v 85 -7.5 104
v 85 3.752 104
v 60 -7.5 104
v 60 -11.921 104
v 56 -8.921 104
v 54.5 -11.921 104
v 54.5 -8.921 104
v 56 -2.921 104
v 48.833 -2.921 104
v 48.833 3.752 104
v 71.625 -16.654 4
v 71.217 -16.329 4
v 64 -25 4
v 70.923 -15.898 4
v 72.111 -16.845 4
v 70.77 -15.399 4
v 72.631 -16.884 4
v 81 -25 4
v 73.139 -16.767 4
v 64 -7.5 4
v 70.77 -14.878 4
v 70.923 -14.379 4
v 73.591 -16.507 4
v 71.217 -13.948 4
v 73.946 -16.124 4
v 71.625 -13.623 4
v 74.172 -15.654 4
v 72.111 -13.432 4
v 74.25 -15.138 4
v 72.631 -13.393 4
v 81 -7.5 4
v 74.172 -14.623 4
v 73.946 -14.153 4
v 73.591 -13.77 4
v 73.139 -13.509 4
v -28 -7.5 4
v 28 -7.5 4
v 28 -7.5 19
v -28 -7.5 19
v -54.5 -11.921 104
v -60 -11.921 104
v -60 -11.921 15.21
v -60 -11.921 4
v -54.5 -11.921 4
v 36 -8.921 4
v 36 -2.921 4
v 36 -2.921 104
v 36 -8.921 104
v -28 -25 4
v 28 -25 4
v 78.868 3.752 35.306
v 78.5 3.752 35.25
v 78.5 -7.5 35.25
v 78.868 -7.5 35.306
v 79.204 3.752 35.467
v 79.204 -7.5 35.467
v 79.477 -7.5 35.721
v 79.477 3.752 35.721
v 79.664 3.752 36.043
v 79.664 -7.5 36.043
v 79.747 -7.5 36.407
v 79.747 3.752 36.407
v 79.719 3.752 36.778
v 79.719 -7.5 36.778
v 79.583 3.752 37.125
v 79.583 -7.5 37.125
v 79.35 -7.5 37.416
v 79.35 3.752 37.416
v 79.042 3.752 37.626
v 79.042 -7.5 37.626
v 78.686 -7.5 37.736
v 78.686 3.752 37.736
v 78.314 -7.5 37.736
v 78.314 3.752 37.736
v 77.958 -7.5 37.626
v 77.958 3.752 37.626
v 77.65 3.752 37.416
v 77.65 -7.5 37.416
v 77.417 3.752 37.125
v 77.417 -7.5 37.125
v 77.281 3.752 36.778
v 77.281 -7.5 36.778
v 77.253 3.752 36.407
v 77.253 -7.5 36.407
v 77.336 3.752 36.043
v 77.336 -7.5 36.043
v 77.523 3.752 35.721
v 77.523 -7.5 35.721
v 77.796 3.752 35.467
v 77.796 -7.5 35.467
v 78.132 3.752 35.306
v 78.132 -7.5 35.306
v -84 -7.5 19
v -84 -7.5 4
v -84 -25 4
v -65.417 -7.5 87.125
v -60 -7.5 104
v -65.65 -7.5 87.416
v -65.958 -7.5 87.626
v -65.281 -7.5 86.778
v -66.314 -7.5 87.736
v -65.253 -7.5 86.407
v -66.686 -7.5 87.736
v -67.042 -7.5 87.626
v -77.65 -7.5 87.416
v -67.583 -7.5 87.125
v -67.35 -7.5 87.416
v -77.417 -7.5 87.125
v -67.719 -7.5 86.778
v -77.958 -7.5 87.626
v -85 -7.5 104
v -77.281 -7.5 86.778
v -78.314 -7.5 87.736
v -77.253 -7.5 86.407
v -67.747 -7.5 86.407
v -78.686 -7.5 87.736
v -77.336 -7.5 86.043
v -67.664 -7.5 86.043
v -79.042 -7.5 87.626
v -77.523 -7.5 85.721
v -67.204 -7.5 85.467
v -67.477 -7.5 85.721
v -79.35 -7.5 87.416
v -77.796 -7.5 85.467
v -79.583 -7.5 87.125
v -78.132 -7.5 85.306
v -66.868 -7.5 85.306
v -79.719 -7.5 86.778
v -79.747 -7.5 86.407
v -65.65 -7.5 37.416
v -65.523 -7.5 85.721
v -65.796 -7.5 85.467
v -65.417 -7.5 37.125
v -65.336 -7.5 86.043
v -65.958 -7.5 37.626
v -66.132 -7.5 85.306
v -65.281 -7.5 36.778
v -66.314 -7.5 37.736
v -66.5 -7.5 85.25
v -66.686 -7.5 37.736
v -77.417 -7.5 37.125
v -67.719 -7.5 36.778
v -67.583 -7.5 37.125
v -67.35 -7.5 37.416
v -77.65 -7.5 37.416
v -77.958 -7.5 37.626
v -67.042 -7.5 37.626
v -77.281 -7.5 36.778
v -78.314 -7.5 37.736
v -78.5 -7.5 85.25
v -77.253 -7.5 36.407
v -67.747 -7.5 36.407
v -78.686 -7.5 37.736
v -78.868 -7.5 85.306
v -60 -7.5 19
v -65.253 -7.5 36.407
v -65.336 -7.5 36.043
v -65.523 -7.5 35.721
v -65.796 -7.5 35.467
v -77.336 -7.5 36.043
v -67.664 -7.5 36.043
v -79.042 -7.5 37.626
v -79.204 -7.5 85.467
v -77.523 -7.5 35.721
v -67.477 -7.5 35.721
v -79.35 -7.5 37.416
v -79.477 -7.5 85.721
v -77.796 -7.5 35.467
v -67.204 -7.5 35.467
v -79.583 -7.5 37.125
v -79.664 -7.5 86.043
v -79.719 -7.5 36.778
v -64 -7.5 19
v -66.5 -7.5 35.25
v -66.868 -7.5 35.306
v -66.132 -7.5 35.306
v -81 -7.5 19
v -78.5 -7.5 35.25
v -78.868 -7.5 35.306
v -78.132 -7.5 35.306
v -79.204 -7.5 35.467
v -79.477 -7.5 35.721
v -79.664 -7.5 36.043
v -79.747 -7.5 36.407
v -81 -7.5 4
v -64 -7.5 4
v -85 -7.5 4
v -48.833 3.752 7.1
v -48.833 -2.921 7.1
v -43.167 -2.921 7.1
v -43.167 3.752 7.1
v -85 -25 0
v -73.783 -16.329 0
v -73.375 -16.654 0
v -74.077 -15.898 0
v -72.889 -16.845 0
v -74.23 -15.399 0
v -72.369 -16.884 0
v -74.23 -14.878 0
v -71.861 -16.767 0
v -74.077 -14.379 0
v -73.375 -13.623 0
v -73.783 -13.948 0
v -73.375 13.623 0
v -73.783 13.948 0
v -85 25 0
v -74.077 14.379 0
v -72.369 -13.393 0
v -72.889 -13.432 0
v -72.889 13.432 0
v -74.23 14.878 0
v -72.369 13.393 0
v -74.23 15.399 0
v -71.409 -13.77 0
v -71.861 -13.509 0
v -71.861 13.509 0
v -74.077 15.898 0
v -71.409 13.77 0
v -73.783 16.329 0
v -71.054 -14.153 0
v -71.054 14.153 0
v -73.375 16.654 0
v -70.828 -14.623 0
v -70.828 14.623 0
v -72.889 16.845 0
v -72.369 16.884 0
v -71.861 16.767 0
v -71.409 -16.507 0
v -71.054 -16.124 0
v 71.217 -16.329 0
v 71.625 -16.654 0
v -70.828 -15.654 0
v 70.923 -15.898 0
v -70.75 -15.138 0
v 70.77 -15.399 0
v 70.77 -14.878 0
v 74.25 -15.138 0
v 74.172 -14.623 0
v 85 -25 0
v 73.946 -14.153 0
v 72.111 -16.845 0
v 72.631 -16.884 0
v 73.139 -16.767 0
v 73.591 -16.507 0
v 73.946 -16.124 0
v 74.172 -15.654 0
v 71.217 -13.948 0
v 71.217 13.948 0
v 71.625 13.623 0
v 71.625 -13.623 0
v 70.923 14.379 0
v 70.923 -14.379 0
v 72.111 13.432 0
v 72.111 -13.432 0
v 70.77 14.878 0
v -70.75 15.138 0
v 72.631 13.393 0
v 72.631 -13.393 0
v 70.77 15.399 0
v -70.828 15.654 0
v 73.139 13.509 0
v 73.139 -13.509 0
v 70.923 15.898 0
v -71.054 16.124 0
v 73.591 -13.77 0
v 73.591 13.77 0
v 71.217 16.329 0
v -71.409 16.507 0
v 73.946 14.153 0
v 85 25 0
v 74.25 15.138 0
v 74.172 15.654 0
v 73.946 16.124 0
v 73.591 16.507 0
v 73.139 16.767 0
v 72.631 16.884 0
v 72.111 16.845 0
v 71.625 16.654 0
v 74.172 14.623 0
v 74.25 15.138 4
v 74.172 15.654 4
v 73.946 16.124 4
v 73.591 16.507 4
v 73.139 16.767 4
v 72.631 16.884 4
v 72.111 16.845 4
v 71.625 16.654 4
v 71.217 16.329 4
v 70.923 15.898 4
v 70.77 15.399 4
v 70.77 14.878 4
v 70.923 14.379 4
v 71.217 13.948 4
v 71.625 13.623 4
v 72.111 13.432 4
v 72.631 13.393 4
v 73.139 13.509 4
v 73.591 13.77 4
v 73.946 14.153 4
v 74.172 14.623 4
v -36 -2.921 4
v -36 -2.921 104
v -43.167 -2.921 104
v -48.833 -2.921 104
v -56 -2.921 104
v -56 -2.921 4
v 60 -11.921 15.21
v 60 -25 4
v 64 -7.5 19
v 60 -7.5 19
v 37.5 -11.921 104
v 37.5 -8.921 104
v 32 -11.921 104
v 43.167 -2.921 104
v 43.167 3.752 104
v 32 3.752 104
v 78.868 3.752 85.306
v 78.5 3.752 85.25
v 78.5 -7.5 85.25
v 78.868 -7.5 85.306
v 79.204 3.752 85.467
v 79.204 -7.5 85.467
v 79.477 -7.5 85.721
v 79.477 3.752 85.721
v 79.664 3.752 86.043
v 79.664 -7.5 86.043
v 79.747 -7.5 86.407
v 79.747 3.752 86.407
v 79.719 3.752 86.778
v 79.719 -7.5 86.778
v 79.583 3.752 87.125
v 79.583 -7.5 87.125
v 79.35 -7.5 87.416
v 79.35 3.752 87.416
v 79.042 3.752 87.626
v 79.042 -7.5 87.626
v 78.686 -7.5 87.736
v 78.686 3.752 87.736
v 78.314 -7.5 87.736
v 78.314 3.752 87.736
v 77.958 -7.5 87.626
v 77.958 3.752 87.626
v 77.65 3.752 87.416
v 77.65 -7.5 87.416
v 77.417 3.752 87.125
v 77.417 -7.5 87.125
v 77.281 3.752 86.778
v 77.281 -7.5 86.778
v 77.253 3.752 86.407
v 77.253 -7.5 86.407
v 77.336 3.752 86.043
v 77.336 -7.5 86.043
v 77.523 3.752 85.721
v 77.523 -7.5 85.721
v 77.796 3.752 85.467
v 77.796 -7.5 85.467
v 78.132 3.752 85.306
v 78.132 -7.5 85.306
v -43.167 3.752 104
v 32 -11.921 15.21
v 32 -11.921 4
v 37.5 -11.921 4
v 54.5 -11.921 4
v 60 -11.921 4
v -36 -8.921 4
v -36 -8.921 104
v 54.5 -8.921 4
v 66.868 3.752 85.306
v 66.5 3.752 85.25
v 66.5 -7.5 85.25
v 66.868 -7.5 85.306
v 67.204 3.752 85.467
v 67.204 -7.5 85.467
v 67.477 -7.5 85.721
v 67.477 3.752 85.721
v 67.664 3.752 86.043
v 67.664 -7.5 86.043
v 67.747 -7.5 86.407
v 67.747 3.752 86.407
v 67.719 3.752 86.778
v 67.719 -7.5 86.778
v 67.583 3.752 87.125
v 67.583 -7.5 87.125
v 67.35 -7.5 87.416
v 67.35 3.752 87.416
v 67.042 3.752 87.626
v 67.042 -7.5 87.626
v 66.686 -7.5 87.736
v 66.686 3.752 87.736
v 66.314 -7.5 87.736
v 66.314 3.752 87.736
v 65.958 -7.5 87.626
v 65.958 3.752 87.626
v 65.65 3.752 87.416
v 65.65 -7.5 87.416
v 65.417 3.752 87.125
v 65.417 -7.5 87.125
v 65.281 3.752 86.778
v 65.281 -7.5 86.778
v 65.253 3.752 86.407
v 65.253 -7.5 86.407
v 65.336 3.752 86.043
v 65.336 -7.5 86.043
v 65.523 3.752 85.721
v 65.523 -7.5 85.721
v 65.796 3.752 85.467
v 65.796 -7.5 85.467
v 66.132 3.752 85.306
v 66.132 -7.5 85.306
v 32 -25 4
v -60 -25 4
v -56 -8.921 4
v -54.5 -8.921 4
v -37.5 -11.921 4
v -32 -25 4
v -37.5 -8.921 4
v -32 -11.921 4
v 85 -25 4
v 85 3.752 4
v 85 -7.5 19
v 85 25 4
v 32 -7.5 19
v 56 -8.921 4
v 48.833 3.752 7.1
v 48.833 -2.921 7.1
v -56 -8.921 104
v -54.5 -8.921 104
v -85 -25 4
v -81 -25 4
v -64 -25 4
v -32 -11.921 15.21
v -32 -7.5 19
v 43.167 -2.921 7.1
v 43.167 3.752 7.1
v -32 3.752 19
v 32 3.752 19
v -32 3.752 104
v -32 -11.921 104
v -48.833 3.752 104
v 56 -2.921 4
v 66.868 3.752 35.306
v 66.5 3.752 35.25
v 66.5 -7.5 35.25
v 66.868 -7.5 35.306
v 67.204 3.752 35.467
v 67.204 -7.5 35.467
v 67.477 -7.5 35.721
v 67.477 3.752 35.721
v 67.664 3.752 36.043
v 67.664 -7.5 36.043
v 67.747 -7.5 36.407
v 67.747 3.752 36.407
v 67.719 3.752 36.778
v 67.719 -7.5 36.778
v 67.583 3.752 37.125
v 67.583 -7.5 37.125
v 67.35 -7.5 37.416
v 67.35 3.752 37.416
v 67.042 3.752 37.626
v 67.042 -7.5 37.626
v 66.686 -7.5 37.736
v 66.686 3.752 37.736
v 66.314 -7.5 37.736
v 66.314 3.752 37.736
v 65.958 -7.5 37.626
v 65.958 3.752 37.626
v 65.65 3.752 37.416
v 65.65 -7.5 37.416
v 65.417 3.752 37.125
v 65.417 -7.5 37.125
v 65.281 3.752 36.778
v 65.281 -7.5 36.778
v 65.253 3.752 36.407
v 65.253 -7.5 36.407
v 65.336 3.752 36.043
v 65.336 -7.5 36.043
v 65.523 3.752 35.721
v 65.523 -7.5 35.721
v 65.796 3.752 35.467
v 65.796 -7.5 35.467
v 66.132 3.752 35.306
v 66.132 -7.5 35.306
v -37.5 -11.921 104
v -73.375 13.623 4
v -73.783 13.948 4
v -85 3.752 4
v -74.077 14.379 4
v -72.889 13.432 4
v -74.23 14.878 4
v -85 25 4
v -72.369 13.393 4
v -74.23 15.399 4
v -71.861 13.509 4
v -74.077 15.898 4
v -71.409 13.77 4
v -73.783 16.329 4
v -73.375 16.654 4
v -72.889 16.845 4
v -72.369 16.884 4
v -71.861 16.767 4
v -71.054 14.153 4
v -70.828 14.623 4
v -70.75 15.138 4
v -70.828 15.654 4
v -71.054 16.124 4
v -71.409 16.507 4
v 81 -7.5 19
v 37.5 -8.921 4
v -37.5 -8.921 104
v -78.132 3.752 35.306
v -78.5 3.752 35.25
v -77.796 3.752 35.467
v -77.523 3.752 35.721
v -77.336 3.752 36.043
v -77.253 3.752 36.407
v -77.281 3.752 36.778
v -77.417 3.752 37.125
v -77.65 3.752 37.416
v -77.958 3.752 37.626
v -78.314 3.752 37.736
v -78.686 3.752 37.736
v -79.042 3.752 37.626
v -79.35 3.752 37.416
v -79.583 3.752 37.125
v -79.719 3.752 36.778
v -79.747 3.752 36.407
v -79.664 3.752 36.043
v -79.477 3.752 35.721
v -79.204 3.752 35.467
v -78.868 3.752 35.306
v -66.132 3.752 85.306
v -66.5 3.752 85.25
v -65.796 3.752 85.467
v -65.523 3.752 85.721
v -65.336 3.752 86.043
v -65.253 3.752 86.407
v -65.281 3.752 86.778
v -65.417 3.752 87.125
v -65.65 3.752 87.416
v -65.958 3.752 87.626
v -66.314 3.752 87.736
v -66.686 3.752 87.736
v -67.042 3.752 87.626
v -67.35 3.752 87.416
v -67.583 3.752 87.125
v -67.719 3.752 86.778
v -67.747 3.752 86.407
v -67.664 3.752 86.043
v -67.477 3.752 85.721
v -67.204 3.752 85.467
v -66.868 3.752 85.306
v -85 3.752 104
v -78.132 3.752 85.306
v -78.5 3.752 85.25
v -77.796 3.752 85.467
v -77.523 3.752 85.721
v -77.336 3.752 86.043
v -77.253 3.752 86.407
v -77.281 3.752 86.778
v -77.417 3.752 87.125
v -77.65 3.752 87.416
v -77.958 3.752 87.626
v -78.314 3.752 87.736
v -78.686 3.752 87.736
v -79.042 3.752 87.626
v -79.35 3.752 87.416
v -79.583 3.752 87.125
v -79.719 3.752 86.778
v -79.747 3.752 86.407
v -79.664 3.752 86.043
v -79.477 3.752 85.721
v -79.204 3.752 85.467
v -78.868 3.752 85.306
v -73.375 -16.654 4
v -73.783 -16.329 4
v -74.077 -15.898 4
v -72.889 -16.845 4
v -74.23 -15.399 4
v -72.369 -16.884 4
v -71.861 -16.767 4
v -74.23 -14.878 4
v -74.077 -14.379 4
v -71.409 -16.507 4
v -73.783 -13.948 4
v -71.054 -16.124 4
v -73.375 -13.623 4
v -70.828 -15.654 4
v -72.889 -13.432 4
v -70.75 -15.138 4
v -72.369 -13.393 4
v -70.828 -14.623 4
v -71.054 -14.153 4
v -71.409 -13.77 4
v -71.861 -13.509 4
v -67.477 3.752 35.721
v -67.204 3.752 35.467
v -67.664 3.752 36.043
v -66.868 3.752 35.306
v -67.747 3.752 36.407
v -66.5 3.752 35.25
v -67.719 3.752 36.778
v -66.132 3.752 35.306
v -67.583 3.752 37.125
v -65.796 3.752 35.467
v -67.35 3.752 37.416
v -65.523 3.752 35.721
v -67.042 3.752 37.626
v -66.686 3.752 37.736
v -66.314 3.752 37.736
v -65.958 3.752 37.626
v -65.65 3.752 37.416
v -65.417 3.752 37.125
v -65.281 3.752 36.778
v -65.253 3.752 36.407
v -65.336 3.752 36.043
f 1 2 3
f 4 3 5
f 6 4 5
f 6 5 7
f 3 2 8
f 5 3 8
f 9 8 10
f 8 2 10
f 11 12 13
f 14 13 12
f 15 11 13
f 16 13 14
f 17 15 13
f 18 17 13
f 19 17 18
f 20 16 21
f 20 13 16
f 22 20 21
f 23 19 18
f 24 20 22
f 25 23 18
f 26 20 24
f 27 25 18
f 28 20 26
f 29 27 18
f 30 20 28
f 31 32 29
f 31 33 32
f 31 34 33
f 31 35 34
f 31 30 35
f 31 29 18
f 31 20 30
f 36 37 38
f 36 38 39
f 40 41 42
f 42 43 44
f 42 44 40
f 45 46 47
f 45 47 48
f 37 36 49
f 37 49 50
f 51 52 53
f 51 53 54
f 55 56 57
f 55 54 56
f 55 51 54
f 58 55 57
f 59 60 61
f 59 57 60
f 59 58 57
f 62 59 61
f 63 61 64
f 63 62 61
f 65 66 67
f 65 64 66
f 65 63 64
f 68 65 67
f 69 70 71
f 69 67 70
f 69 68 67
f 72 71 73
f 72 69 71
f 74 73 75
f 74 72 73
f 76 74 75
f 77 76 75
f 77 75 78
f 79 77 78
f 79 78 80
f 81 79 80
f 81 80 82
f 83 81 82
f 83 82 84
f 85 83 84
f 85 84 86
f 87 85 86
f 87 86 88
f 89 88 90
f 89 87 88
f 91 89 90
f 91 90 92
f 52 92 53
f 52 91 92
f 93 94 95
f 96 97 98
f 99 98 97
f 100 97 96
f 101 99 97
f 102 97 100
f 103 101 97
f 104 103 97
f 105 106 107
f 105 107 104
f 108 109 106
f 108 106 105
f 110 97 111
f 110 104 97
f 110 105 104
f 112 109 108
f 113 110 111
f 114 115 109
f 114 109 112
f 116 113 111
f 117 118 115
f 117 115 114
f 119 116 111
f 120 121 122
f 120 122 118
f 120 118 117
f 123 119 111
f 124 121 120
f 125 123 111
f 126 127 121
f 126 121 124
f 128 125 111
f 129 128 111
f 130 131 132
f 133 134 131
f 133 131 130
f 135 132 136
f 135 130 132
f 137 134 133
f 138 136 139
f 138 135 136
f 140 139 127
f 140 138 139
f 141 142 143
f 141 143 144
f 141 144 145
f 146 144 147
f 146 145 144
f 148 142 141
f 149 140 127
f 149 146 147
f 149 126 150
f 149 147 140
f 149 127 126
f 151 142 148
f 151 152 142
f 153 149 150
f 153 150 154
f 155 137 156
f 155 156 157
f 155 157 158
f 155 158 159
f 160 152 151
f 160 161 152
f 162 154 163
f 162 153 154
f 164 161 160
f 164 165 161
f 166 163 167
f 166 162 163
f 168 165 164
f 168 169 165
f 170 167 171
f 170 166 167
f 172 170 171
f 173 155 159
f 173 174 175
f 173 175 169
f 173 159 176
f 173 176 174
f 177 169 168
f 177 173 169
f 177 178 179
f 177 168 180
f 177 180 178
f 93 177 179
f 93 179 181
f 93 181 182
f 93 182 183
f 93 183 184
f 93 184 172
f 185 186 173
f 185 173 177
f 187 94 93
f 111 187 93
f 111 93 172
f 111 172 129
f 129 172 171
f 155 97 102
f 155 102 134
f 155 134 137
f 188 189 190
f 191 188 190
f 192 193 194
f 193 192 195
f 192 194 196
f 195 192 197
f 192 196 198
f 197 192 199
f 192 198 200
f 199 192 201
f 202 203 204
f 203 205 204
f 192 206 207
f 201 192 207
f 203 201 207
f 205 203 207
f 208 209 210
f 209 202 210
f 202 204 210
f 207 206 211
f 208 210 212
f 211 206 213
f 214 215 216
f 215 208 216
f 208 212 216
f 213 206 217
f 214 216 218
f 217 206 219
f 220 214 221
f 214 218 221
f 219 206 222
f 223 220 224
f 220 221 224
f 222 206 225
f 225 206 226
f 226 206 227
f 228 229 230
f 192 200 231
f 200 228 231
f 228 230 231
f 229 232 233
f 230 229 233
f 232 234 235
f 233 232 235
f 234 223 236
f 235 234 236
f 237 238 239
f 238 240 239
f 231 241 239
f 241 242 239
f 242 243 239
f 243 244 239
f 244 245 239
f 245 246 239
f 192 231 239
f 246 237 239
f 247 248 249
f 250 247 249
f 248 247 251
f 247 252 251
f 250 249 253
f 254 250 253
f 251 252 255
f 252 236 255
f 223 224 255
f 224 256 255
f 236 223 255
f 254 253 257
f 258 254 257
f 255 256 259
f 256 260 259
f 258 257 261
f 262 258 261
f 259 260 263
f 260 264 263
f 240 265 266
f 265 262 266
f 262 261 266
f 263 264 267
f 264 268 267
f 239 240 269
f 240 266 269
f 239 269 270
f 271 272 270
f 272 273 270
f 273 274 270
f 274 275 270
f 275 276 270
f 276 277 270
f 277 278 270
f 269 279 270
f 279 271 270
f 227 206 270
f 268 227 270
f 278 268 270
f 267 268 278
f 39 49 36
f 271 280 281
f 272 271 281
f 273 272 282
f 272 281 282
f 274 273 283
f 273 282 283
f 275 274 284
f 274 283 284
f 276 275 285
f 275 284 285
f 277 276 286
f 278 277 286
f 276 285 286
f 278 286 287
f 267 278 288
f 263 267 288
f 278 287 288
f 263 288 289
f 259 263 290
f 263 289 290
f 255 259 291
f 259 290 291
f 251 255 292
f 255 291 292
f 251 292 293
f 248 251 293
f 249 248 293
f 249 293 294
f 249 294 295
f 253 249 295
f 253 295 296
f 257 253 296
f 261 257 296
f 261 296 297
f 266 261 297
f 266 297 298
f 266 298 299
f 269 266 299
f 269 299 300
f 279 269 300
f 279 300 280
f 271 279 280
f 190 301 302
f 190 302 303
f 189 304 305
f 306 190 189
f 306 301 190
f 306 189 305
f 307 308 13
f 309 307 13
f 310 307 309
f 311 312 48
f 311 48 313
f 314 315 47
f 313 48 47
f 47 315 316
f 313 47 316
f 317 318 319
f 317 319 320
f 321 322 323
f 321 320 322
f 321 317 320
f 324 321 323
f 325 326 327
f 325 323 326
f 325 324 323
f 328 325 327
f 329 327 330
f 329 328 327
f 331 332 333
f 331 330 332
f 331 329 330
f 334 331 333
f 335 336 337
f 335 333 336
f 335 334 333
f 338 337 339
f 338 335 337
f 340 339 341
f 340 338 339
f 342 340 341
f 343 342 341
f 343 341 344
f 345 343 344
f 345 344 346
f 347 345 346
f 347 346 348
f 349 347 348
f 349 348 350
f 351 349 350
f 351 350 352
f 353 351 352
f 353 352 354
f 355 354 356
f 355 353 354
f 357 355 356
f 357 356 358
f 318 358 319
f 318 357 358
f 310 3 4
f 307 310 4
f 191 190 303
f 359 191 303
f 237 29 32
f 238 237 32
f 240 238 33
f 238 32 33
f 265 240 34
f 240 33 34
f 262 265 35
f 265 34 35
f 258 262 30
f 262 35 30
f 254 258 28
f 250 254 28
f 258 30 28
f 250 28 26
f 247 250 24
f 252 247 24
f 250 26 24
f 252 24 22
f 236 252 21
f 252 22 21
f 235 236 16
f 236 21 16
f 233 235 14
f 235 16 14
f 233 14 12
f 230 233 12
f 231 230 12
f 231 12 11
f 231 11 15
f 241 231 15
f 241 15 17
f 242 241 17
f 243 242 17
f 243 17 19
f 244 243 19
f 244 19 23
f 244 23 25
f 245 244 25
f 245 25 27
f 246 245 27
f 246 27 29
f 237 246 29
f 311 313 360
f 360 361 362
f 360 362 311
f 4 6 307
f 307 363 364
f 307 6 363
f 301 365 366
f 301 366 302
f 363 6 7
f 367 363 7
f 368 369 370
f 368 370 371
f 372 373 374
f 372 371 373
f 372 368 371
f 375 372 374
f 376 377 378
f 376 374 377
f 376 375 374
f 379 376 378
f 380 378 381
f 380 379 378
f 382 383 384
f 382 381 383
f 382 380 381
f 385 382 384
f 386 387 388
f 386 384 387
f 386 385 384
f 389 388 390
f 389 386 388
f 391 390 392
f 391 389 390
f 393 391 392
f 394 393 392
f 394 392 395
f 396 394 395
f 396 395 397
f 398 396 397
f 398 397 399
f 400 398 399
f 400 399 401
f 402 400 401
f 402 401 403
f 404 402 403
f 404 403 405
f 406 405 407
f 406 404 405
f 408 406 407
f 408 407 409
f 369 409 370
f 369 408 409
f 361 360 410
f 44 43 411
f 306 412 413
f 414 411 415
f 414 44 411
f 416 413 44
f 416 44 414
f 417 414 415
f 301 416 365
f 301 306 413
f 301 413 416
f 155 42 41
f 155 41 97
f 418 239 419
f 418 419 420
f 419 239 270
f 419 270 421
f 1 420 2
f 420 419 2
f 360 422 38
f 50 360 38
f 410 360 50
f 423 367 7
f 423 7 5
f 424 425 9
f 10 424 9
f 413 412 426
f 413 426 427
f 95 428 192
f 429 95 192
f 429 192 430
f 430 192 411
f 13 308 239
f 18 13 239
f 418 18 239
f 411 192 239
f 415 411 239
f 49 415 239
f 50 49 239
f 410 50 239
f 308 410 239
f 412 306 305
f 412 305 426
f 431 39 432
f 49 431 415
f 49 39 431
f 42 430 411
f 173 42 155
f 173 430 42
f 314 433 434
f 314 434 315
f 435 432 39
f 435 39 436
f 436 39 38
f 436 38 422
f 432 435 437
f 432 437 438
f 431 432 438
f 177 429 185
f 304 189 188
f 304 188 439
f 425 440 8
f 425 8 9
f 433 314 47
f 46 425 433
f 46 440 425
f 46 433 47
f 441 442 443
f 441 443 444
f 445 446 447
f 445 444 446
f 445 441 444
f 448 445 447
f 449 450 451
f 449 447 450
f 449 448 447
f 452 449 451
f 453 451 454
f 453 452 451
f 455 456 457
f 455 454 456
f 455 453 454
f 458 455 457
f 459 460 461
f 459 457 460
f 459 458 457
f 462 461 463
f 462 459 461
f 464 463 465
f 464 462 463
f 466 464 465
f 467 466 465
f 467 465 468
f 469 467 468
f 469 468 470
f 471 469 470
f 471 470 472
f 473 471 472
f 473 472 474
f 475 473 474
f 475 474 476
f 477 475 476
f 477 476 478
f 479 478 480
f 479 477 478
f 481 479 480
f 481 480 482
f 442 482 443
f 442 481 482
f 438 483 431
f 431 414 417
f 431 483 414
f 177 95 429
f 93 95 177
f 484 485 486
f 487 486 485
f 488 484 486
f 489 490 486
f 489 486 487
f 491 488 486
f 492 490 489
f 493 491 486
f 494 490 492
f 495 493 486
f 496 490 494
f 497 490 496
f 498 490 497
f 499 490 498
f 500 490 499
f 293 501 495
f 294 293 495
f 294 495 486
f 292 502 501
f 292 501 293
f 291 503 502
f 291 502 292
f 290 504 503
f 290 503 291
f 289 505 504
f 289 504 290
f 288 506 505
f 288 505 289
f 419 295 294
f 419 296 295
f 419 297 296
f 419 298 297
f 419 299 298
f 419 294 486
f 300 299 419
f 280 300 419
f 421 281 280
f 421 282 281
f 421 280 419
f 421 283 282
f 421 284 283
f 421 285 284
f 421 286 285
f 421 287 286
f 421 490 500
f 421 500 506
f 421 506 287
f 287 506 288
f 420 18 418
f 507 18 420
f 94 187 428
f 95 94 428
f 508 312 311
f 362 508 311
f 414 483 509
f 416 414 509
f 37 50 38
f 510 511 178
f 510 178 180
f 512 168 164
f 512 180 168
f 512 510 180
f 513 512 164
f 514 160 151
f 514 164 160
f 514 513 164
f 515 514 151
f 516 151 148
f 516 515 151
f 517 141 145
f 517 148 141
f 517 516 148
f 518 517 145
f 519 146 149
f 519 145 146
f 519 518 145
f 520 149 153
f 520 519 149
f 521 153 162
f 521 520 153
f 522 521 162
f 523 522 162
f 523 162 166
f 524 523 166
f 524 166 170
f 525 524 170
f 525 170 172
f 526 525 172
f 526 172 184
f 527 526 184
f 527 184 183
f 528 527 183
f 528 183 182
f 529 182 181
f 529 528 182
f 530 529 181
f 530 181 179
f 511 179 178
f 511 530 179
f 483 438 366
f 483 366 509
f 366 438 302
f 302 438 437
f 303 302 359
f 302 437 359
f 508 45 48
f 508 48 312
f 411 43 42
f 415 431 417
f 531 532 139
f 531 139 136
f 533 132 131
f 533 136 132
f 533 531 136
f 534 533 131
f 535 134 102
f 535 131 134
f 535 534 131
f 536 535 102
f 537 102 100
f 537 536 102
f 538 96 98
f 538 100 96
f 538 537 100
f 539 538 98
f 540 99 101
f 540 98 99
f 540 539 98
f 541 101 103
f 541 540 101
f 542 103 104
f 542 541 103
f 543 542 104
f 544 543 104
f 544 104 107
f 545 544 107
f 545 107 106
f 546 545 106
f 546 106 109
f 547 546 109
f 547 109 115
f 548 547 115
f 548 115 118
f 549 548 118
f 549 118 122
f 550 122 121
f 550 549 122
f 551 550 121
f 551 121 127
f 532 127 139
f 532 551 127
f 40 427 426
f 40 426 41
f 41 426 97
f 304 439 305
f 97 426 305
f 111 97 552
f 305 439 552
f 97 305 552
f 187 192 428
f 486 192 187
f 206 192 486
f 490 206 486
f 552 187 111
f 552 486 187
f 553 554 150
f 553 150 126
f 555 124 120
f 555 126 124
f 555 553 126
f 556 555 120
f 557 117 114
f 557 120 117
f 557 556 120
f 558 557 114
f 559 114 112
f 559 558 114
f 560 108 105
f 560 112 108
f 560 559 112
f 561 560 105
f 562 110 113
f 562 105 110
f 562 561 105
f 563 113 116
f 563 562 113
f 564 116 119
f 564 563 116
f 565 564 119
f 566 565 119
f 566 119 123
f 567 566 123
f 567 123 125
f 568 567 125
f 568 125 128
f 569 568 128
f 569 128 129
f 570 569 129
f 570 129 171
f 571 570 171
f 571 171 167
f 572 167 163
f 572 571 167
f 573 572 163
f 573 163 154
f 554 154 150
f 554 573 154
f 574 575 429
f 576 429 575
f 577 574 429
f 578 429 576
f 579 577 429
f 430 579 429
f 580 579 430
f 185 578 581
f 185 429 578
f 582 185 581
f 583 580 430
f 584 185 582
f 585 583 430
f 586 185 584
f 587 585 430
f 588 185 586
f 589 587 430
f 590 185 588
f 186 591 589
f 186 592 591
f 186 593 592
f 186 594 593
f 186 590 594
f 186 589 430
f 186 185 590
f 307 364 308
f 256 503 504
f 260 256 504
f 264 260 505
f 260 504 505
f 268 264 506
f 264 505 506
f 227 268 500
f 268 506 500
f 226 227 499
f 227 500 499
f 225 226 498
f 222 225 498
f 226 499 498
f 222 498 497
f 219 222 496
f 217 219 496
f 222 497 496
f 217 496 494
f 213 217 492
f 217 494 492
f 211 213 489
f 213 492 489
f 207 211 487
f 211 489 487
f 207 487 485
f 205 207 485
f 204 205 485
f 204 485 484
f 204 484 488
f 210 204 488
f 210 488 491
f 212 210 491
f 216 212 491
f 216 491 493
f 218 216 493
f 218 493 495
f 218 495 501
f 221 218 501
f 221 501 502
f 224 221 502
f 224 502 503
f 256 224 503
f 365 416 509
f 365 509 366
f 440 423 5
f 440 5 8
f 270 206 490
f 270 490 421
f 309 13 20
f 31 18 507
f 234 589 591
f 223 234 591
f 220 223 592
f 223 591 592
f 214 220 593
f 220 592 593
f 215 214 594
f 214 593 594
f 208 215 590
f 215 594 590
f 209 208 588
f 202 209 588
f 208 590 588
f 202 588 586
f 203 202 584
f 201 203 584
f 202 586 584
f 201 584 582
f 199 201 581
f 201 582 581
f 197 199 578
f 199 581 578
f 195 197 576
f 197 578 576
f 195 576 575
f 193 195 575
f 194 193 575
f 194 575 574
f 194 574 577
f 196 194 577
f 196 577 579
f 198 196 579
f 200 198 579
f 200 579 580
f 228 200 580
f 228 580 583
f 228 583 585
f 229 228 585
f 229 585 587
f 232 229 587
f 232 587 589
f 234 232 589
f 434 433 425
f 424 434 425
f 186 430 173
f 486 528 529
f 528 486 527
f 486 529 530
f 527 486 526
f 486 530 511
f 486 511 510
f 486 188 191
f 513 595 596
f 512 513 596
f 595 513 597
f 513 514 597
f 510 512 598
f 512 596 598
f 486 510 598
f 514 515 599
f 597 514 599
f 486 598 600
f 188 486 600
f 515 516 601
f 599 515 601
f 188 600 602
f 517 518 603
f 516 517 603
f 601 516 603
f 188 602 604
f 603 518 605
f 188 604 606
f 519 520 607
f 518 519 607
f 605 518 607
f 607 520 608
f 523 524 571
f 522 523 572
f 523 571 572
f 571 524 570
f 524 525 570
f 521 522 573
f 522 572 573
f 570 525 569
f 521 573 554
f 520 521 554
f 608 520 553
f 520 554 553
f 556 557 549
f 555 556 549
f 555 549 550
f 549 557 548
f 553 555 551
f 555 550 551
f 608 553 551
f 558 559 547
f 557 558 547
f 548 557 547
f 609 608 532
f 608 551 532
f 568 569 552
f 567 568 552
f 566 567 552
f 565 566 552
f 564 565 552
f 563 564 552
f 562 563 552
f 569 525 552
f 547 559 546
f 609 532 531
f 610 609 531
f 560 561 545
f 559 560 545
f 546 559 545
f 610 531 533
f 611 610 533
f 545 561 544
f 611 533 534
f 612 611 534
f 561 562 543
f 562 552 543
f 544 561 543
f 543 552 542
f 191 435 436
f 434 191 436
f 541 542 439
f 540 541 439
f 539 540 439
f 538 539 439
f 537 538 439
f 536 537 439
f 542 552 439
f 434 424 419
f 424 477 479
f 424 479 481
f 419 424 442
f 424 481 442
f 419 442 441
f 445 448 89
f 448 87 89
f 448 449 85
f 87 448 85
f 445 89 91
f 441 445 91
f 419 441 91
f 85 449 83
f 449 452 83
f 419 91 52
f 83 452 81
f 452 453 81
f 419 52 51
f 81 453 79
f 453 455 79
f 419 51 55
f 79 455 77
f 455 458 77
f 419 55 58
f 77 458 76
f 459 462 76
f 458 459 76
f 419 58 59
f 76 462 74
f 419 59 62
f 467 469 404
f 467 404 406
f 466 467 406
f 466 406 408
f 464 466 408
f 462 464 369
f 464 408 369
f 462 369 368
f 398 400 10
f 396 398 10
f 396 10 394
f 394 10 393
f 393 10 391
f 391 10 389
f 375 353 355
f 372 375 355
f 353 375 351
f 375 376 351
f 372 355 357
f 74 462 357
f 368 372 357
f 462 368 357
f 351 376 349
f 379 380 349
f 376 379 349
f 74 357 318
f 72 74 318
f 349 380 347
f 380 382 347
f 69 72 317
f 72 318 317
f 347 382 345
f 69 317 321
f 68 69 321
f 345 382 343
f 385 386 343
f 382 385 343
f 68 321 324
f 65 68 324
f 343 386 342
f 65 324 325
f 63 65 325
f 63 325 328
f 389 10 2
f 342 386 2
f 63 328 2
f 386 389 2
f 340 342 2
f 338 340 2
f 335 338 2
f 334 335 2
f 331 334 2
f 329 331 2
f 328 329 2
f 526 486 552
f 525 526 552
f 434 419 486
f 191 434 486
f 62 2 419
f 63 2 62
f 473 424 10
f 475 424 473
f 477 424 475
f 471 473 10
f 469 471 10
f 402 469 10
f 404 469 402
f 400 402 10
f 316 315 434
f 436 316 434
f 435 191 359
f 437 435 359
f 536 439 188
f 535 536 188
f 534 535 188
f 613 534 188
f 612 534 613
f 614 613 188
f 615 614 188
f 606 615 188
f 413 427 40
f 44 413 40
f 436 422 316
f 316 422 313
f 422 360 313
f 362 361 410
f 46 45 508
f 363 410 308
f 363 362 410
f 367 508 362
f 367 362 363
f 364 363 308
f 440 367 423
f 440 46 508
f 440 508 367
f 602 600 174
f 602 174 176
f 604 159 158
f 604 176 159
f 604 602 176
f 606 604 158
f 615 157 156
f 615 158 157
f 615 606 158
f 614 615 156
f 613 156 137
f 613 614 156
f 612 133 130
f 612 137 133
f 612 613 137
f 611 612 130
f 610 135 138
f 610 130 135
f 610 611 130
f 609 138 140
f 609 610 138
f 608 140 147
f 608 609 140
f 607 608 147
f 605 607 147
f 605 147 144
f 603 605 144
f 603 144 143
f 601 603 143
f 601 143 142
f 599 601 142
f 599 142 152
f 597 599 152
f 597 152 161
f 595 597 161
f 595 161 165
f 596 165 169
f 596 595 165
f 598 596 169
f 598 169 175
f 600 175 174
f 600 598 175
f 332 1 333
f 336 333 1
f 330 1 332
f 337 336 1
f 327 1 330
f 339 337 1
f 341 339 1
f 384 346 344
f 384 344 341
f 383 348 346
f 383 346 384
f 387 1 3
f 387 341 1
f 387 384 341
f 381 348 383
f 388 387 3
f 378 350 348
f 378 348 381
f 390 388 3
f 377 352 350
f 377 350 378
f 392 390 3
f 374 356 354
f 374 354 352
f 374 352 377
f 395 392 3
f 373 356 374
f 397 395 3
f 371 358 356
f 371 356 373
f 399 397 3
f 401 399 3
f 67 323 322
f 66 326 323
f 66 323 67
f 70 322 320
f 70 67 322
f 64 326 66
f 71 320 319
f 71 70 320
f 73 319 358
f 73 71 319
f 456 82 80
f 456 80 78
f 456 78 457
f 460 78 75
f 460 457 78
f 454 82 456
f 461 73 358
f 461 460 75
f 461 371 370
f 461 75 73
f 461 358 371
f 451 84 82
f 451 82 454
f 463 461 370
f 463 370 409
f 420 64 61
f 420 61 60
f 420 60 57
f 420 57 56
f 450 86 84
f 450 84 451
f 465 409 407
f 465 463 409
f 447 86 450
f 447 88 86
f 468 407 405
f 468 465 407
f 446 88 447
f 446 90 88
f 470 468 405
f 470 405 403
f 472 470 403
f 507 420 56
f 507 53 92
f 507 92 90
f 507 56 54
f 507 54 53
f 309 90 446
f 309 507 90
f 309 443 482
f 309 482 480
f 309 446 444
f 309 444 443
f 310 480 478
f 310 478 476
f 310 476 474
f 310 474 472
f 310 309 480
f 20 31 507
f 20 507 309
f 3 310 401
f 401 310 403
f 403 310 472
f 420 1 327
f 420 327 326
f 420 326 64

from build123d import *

# Parameters (mm, degrees)
CROQUIS1_W                  = 170
CROQUIS1_H                  = 50
SALIENTE_EXTRUIR1_DEPTH     = 4
SALIENTE_EXTRUIR2_DEPTH     = 100
SALIENTE_EXTRUIR3_DEPTH     = 25
SALIENTE_EXTRUIR4_DEPTH     = 64
SALIENTE_EXTRUIR5_DEPTH     = 25
CROQUIS9_W                  = 17
CROQUIS9_H                  = 17.5
CROQUIS9_W_2                = 56
CORTAR_EXTRUIR1_DEPTH       = 100
CROQUIS11_W                 = 64
CROQUIS11_H                 = 85
CORTAR_EXTRUIR4_DEPTH       = 15
CROQUIS12_R                 = 1.75
CORTAR_EXTRUIR5_DEPTH       = 15
CORTAR_EXTRUIR6_DEPTH       = 1
CROQUIS16_W                 = 170
CROQUIS16_H                 = 3.747948586
CORTAR_EXTRUIR7_DEPTH       = 100
CORTAR_EXTRUIR10_DEPTH      = 139.192800102
CORTAR_EXTRUIR10_DEPTH_BACK = 139.192800102
CROQUIS20_R                 = 1.25
CROQUIS21_W                 = 5.666666666
CROQUIS21_H                 = 96.899748192
CORTAR_EXTRUIR11_DEPTH      = 10


with BuildPart() as part:
    # Croquis1 → Saliente-Extruir1 (new body)
    with BuildSketch(Plane.XY):
        Rectangle(CROQUIS1_W, CROQUIS1_H)
    extrude(amount=SALIENTE_EXTRUIR1_DEPTH)

    # Croquis3 → Saliente-Extruir2 (add)
    with BuildSketch(Plane.XY.offset(4)):
        Polygon((-85, 7.5), (85, 7.5), (85, -7.5), (60, -7.5), (60, -11.921199344), (56, -11.921199344), (54.5, -11.921199344), (54.5, -8.921199344), (56, -8.921199344), (56, -2.921199344), (36, -2.921199344), (36, -8.921199344), (37.5, -8.921199344), (37.5, -11.921199344), (36, -11.921199344), (32, -11.921199344), (32, -7.5), (-32, -7.5), (-32, -11.921199344), (-36, -11.921199344), (-37.5, -11.921199344), (-37.5, -8.921199344), (-36, -8.921199344), (-36, -2.921199344), (-56, -2.921199344), (-56, -8.921199344), (-54.5, -8.921199344), (-54.5, -11.921199344), (-56, -11.921199344), (-60, -11.921199344), (-60, -7.5), (-85, -7.5), align=None)
    extrude(amount=SALIENTE_EXTRUIR2_DEPTH)

    # Croquis4 → Saliente-Extruir3 (add)
    with BuildSketch(Plane.ZY.offset(85)):
        Polygon((4, -25), (19, -7.5), (4, -7.5), align=None)
    extrude(amount=-SALIENTE_EXTRUIR3_DEPTH)

    # Croquis5 → Saliente-Extruir4 (add)
    with BuildSketch(Plane.ZY.offset(-32)):
        Polygon((19, -7.5), (4, -25), (4, -7.5), align=None)
    extrude(amount=SALIENTE_EXTRUIR4_DEPTH)

    # Croquis7 → Saliente-Extruir5 (add)
    with BuildSketch(Plane(origin=(60, 0, 0), x_dir=(0, 0, -1), z_dir=(1, 0, 0))):
        Polygon((-4, -25), (-19, -7.5), (-4, -7.5), align=None)
    extrude(amount=SALIENTE_EXTRUIR5_DEPTH)

    # Croquis9 → Cortar-Extruir1 (cut)
    with BuildSketch(Plane.XY.offset(104)):
        with Locations((-72.5, -16.25)):
            Rectangle(CROQUIS9_W, CROQUIS9_H)
        with Locations((0, -16.25)):
            Rectangle(CROQUIS9_W_2, CROQUIS9_H)
        with Locations((72.5, -16.25)):
            Rectangle(CROQUIS9_W, CROQUIS9_H)
    extrude(amount=-CORTAR_EXTRUIR1_DEPTH, mode=Mode.SUBTRACT)

    # Croquis11 → Cortar-Extruir4 (cut)
    with BuildSketch(Plane.XZ.offset(7.5)):
        with Locations((0, 61.5)):
            Rectangle(CROQUIS11_W, CROQUIS11_H)
    extrude(amount=-CORTAR_EXTRUIR4_DEPTH, mode=Mode.SUBTRACT)

    # Croquis12 → Cortar-Extruir5 (cut)
    with BuildSketch(Plane.XY.offset(4)):
        with Locations((-72.5, 15.138462845)):
            Circle(CROQUIS12_R)
        with Locations((-72.5, -15.138462845)):
            Circle(CROQUIS12_R)
        with Locations((72.5, -15.138462845)):
            Circle(CROQUIS12_R)
        with Locations((72.5, 15.138462845)):
            Circle(CROQUIS12_R)
    extrude(amount=-CORTAR_EXTRUIR5_DEPTH, mode=Mode.SUBTRACT)

    # Croquis14 → Cortar-Extruir6 (cut)
    with BuildSketch(Plane.ZY.offset(85)):
        Polygon((19, -7.5), (4, -7.5), (4, -25), align=None)
    extrude(amount=-CORTAR_EXTRUIR6_DEPTH, mode=Mode.SUBTRACT)

    # Croquis16 → Cortar-Extruir7 (cut)
    with BuildSketch(Plane.XY.offset(104)):
        with Locations((0, 5.626025707)):
            Rectangle(CROQUIS16_W, CROQUIS16_H)
    extrude(amount=-CORTAR_EXTRUIR7_DEPTH, mode=Mode.SUBTRACT)

    # Croquis20 → Cortar-Extruir10 (cut, two sides: drawn at the far end of the back side and taken through both)
    with BuildSketch(Plane.XZ.offset(7.5).offset(-CORTAR_EXTRUIR10_DEPTH_BACK)):
        with Locations(Location((-78.5, 86.5, 0), (0, 0, 270))):
            Circle(CROQUIS20_R)
        with Locations(Location((-66.5, 86.5, 0), (0, 0, 270))):
            Circle(CROQUIS20_R)
        with Locations(Location((-66.5, 36.5, 0), (0, 0, 270))):
            Circle(CROQUIS20_R)
        with Locations(Location((-78.5, 36.5, 0), (0, 0, 270))):
            Circle(CROQUIS20_R)
        with Locations(Location((66.5, 36.5, 0), (0, 0, 270))):
            Circle(CROQUIS20_R)
        with Locations(Location((78.5, 36.5, 0), (0, 0, 270))):
            Circle(CROQUIS20_R)
        with Locations(Location((66.5, 86.5, 0), (0, 0, 270))):
            Circle(CROQUIS20_R)
        with Locations(Location((78.5, 86.5, 0), (0, 0, 270))):
            Circle(CROQUIS20_R)
    extrude(amount=CORTAR_EXTRUIR10_DEPTH + CORTAR_EXTRUIR10_DEPTH_BACK, mode=Mode.SUBTRACT)

    # Croquis21 → Cortar-Extruir11 (cut)
    with BuildSketch(Plane.XZ.offset(2.921199344)):
        with Locations((-46, 55.550125904)):
            Rectangle(CROQUIS21_W, CROQUIS21_H)
        with Locations((46, 55.550125904)):
            Rectangle(CROQUIS21_W, CROQUIS21_H)
    extrude(amount=-CORTAR_EXTRUIR11_DEPTH, mode=Mode.SUBTRACT)


solid = part.part
